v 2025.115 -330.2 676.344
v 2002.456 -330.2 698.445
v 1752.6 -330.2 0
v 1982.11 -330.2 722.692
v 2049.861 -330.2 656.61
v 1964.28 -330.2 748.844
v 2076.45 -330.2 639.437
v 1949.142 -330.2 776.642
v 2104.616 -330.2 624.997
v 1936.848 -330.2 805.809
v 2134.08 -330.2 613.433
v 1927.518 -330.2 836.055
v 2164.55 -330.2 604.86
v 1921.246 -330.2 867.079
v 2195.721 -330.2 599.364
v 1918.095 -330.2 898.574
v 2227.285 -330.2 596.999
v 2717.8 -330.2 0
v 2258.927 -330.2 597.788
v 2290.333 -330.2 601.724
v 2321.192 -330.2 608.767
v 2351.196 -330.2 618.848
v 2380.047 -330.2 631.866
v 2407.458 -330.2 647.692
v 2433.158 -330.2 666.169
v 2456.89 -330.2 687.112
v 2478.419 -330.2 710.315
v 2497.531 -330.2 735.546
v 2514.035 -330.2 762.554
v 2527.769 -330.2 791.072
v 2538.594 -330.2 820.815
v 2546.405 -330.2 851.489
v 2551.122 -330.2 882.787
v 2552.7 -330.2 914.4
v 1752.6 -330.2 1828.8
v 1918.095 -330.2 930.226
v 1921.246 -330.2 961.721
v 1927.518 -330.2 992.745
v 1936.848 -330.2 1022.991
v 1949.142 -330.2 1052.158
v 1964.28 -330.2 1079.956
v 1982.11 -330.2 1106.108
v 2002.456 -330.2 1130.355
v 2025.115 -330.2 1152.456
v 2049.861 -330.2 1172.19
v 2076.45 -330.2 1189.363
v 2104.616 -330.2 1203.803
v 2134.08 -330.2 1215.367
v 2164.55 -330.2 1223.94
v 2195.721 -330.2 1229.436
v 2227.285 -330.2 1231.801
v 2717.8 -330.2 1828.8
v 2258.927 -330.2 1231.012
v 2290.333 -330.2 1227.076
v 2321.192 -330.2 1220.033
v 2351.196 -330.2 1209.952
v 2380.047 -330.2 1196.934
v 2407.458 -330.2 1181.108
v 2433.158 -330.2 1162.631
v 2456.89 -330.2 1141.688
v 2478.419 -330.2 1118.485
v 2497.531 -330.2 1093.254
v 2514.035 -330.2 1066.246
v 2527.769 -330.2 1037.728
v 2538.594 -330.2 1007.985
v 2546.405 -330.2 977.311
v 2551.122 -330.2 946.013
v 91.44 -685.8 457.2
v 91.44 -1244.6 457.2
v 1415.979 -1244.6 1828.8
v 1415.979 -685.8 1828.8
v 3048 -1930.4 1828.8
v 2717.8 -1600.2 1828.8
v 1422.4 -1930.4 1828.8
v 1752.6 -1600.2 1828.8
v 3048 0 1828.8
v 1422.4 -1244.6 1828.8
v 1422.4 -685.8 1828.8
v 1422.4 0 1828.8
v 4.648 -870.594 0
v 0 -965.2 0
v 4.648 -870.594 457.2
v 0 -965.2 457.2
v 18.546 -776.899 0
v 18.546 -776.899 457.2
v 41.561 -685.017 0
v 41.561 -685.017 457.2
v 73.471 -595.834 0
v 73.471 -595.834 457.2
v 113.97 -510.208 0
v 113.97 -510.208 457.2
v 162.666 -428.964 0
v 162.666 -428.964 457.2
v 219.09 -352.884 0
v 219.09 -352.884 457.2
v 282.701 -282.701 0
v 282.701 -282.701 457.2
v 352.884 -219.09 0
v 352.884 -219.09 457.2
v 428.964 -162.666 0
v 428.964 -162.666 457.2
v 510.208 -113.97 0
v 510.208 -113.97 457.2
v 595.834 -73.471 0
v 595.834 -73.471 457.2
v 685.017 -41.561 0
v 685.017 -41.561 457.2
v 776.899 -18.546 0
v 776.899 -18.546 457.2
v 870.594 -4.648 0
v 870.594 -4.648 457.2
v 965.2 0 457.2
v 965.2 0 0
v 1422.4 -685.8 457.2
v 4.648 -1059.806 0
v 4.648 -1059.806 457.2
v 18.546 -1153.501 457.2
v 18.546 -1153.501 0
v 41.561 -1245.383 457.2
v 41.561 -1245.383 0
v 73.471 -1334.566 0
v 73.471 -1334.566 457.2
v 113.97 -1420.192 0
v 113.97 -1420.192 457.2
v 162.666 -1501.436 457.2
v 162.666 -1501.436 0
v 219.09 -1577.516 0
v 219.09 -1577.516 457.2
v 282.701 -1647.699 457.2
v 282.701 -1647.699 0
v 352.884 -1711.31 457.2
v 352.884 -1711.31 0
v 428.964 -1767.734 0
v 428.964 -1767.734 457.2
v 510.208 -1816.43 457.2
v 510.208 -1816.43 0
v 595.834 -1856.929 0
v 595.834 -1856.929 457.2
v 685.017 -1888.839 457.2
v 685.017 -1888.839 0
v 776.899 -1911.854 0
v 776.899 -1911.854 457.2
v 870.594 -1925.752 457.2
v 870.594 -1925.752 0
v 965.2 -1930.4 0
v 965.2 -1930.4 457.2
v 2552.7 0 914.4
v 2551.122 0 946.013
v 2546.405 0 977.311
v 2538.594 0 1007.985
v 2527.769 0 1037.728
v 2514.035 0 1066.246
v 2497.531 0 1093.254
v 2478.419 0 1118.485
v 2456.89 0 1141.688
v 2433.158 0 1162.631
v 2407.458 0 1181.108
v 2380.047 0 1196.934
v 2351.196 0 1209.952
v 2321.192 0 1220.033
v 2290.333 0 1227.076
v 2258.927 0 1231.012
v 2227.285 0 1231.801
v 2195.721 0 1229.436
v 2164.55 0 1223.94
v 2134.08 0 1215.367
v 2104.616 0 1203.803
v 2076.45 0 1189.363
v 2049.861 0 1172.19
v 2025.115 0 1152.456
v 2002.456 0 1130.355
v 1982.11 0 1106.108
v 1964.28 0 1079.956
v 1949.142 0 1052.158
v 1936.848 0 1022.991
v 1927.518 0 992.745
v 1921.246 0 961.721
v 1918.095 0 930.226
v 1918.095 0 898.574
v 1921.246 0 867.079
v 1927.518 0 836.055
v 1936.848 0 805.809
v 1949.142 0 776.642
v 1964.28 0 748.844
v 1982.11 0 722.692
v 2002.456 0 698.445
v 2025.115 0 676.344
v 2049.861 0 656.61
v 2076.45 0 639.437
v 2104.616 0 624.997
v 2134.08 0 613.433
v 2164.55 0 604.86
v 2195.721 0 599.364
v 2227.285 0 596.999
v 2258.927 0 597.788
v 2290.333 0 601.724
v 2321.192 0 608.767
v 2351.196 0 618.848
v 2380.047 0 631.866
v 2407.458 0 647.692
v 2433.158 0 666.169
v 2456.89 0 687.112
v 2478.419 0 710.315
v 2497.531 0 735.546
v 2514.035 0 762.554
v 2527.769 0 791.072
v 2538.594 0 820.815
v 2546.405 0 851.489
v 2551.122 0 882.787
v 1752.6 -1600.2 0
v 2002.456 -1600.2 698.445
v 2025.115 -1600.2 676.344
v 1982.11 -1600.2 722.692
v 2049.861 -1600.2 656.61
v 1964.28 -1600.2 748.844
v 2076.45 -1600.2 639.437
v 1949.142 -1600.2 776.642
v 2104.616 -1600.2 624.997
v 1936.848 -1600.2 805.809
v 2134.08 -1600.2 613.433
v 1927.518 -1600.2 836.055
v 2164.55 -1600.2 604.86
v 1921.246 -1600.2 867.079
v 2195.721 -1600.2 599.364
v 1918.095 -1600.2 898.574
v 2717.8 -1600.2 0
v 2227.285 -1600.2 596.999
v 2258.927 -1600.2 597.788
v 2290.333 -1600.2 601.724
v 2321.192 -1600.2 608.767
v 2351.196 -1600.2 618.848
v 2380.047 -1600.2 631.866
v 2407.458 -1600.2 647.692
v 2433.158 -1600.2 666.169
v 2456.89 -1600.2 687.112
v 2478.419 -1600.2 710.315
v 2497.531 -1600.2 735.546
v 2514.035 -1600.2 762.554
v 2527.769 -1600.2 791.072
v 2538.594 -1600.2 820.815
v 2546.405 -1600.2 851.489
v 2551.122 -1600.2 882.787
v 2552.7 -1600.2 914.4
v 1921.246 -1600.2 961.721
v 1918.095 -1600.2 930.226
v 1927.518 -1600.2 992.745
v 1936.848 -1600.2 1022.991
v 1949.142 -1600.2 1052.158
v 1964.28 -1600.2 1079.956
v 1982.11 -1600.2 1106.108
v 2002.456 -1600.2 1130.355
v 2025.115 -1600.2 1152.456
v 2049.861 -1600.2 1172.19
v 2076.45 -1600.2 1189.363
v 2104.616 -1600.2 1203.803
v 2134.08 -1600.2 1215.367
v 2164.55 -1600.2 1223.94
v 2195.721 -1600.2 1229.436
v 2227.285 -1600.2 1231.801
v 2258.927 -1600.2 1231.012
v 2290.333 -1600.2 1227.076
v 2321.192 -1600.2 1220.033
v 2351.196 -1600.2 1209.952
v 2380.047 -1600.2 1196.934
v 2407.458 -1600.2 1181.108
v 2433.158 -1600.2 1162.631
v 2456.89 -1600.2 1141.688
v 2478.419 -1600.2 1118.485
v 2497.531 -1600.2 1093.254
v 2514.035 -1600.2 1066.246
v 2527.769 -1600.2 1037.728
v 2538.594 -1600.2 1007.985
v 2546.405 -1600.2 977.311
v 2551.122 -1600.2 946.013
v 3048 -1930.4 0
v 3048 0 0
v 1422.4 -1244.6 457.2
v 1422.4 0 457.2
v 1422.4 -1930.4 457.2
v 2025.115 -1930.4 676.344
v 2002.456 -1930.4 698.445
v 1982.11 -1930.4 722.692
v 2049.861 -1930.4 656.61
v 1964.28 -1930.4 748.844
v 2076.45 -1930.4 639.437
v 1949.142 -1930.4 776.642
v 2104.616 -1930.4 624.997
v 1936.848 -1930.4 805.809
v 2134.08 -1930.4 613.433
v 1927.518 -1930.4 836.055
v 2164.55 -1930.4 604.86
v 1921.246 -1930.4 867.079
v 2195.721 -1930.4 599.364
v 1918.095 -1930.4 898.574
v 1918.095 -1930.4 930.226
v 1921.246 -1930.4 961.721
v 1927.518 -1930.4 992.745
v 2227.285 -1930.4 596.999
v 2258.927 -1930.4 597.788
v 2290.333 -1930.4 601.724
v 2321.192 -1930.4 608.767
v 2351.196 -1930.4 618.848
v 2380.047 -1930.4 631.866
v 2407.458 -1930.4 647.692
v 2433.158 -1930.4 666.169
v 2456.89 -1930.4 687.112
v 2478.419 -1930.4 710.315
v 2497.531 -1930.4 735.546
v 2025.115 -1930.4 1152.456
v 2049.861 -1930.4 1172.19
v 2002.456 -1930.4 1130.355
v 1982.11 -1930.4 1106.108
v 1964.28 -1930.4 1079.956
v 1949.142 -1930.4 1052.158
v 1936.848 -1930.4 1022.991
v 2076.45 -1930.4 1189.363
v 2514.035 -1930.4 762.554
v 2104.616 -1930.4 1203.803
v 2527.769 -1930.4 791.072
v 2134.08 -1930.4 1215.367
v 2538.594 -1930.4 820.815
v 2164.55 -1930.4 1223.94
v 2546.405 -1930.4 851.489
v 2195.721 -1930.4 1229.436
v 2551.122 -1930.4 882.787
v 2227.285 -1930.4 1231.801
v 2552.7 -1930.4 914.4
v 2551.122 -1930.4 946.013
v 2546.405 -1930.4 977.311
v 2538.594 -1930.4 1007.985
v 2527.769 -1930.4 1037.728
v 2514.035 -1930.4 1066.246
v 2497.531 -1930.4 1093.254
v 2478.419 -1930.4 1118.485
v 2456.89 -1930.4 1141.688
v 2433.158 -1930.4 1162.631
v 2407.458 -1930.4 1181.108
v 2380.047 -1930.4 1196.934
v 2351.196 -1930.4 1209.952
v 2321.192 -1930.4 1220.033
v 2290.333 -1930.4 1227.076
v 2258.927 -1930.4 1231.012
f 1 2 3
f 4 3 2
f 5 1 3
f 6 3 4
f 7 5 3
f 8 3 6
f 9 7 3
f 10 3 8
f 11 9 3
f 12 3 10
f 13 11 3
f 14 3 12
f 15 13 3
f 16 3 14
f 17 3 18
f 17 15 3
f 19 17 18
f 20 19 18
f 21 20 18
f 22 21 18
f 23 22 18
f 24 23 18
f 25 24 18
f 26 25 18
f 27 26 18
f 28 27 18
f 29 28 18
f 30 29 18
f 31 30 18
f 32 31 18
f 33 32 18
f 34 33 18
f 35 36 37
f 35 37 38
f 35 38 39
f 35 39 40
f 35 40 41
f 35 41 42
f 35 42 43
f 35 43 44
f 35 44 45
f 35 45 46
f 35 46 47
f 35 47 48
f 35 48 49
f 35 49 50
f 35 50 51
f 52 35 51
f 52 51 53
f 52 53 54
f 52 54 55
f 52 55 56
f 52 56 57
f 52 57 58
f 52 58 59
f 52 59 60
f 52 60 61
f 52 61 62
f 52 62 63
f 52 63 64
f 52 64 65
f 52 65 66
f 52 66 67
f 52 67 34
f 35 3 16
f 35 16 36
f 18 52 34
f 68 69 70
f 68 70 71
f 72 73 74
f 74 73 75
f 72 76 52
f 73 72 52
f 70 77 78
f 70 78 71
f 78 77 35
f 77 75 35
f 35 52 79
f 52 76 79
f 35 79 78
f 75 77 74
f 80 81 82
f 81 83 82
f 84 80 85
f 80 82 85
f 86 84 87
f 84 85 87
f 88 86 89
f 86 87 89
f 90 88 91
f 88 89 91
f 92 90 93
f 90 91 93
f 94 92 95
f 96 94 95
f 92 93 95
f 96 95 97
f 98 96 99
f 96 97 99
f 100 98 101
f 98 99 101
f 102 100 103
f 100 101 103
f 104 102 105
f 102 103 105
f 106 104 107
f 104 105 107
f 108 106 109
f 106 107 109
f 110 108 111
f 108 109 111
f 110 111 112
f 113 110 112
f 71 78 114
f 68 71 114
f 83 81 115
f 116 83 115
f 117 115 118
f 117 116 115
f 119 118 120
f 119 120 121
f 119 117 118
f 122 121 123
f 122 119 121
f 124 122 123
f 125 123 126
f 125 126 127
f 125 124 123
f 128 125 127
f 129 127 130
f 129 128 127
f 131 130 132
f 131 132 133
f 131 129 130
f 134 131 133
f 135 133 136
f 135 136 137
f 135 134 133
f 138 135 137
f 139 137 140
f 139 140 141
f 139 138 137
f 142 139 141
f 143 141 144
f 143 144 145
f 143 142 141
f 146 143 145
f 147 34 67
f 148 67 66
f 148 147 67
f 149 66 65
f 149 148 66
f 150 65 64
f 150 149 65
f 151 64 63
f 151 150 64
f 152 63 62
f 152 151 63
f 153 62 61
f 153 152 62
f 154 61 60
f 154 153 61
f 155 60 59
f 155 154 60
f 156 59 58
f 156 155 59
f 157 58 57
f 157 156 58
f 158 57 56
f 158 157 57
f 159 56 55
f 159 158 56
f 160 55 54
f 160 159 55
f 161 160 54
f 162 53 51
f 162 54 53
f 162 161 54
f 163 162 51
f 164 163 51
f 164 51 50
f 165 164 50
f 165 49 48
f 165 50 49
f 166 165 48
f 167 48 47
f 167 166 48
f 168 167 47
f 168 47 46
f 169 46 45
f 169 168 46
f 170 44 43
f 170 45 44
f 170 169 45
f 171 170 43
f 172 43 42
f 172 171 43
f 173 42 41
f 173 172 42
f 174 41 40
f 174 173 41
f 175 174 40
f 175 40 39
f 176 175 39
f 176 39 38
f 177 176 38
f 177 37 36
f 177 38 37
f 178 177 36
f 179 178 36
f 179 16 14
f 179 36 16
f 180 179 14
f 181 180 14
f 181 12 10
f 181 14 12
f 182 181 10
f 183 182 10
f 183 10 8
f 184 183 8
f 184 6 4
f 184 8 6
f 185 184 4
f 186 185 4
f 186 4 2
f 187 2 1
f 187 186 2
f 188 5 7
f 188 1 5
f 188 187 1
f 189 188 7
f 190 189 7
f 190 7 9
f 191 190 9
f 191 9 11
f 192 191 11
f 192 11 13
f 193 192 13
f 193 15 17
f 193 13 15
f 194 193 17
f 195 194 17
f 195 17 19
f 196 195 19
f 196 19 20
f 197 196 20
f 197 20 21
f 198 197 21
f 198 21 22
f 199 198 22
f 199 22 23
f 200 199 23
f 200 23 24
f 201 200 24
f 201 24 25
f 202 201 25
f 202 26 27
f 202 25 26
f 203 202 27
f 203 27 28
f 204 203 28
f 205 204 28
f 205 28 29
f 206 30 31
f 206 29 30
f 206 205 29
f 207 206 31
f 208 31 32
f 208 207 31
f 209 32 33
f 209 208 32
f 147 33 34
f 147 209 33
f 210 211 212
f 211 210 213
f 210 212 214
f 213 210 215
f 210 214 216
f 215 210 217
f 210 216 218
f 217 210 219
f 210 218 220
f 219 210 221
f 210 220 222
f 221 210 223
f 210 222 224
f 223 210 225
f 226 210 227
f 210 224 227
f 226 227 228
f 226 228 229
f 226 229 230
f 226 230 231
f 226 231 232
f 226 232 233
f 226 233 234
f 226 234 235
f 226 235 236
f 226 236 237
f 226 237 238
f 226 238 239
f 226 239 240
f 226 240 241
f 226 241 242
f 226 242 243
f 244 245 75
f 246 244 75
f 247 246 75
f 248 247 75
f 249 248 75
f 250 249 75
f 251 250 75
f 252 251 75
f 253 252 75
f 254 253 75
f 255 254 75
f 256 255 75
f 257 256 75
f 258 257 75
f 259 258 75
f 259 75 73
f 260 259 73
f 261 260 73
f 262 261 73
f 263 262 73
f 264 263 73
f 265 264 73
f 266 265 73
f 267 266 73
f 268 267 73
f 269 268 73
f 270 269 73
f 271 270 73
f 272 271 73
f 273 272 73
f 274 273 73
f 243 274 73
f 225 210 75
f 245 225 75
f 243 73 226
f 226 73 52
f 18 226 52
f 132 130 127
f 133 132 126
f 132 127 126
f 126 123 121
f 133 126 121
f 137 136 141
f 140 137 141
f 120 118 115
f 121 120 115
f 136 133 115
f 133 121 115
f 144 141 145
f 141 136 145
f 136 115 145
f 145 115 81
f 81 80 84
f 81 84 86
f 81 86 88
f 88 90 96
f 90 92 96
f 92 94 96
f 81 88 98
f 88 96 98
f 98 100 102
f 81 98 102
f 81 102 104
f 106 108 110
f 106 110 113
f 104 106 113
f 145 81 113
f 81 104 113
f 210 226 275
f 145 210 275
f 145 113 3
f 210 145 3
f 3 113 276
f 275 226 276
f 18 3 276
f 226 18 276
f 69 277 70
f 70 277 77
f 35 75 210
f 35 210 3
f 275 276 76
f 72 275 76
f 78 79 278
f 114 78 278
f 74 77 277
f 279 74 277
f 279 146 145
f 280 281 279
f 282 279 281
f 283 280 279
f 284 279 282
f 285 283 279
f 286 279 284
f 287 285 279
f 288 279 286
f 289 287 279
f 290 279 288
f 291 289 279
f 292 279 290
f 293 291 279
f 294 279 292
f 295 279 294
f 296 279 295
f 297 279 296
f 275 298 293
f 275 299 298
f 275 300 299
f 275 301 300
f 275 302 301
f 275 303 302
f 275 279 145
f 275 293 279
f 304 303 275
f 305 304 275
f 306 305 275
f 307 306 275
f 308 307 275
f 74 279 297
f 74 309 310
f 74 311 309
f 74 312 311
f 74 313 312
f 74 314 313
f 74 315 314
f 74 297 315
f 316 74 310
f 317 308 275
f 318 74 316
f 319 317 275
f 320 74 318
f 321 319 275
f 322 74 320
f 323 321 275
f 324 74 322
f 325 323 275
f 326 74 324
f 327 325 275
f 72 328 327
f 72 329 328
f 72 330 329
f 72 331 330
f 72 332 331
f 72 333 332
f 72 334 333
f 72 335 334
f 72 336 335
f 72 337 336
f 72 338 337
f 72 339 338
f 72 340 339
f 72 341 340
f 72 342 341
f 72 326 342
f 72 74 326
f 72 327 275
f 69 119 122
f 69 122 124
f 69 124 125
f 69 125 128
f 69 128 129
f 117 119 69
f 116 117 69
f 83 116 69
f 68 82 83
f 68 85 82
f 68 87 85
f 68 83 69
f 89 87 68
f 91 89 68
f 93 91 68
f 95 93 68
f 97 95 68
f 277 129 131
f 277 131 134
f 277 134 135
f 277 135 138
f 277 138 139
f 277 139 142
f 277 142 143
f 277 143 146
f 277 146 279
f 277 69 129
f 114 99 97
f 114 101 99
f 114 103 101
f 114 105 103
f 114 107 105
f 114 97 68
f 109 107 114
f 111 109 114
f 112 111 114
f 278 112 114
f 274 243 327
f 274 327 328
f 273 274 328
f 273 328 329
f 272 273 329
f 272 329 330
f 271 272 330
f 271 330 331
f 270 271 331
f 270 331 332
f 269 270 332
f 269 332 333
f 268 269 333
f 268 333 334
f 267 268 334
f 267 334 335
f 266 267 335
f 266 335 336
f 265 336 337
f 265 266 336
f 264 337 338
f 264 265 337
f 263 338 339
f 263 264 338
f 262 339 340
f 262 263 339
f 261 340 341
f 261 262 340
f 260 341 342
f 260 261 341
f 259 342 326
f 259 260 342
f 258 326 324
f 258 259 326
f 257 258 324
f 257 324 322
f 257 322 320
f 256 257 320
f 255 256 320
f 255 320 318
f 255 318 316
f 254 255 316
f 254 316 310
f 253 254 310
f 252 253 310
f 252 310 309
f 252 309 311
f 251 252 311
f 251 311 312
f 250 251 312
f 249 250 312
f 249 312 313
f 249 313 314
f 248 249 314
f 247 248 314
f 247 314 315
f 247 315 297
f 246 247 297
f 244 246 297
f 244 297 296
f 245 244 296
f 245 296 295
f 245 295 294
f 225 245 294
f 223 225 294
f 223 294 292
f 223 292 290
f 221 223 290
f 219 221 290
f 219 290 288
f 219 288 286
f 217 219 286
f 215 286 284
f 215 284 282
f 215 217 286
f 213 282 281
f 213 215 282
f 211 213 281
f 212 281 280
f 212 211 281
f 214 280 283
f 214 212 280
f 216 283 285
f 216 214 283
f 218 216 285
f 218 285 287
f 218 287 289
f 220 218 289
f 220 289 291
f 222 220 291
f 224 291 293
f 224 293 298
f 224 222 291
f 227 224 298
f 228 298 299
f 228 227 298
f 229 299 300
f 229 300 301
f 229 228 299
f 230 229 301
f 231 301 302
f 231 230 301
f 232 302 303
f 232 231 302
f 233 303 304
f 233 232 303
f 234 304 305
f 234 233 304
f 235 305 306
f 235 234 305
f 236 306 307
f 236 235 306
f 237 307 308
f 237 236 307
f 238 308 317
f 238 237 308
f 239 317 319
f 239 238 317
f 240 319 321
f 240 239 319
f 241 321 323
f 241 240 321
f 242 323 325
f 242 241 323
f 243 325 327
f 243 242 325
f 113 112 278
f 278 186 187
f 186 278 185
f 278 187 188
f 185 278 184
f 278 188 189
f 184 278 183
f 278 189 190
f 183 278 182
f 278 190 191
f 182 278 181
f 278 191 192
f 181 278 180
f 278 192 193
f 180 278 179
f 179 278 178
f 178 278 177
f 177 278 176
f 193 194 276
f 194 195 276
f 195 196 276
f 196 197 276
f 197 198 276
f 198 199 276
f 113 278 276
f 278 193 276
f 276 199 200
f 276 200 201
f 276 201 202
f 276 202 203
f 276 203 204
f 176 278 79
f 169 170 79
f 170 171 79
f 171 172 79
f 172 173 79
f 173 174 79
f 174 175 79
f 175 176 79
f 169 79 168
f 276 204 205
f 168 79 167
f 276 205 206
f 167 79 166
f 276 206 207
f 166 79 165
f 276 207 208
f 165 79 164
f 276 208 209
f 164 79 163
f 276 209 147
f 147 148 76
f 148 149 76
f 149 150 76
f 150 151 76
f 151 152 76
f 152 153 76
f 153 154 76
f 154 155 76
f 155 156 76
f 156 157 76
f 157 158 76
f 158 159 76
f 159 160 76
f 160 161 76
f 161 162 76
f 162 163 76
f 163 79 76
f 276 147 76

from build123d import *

# Parameters (mm, degrees)
F0_W     = 1422.4
F0_H     = 457.2
F0_R     = 317.5
F1_DEPTH = 1930.4
F2_R     = 965.19999
F4_DEPTH = 1330.96
F5_SIZE2 = 1324.538714
F5_SIZE  = 1371.59999
F6_W     = 965.2
F6_H     = 1270
F7_DEPTH = 4841.24


# Not quite as in the source:
# - a fillet or chamfer is up to 0.001 mm smaller than in the source, because OpenCascade refuses the exact size


with BuildPart() as f1:
    # F0 (on Front) → F1 (new body)
    with BuildSketch(Plane.XZ):
        with Locations((711.2, 228.6)):
            Rectangle(F0_W, F0_H)
        Polygon((1422.4, 457.2), (1422.4, 0), (3048, 0), (3048, 1828.8), (1422.4, 1828.8), align=None)
        with Locations((2235.2, 914.4)):
            Circle(F0_R, mode=Mode.SUBTRACT)
    extrude(amount=F1_DEPTH)

    # F2 (radius 965.2 in the source; OpenCascade refuses exactly that, so slightly less here)
    f2_edges = [f1.edges().sort_by_distance(p)[0] for p in [
        (0, 0, 228.6),
        (0, -1930.4, 228.6),
    ]]
    fillet(f2_edges, radius=F2_R)

    # F3 (on face) → F4 (join)
    with BuildSketch(Plane(origin=(1422.4, 0, 0), x_dir=(0, -1, 0), z_dir=(-1, 0, 0))):
        Polygon((1244.6, 1354.5855283737), (1244.6, 1828.8), (685.8, 1828.8), (685.8, 457.2), (1244.6, 457.2), align=None)
    extrude(amount=F4_DEPTH)

    # F5 (size 1371.6 and 1324.5387235254 in the source; OpenCascade refuses exactly that, so slightly less here)
    f5_edges = [f1.edges().sort_by_distance(p)[0] for p in [
        (91.44, -965.2, 1828.8),
    ]]
    f5_side = f1.faces().sort_by_distance((91.44, -965.2, 1143))[0]
    chamfer(f5_edges, length=F5_SIZE, length2=F5_SIZE2, reference=f5_side)

    # F6 (on face) → F7 (cut)
    with BuildSketch(Plane.XY.offset(1828.8)):
        with Locations((2235.2, -965.2)):
            Rectangle(F6_W, F6_H)
    extrude(amount=-F7_DEPTH, mode=Mode.SUBTRACT)


solid = f1.part
